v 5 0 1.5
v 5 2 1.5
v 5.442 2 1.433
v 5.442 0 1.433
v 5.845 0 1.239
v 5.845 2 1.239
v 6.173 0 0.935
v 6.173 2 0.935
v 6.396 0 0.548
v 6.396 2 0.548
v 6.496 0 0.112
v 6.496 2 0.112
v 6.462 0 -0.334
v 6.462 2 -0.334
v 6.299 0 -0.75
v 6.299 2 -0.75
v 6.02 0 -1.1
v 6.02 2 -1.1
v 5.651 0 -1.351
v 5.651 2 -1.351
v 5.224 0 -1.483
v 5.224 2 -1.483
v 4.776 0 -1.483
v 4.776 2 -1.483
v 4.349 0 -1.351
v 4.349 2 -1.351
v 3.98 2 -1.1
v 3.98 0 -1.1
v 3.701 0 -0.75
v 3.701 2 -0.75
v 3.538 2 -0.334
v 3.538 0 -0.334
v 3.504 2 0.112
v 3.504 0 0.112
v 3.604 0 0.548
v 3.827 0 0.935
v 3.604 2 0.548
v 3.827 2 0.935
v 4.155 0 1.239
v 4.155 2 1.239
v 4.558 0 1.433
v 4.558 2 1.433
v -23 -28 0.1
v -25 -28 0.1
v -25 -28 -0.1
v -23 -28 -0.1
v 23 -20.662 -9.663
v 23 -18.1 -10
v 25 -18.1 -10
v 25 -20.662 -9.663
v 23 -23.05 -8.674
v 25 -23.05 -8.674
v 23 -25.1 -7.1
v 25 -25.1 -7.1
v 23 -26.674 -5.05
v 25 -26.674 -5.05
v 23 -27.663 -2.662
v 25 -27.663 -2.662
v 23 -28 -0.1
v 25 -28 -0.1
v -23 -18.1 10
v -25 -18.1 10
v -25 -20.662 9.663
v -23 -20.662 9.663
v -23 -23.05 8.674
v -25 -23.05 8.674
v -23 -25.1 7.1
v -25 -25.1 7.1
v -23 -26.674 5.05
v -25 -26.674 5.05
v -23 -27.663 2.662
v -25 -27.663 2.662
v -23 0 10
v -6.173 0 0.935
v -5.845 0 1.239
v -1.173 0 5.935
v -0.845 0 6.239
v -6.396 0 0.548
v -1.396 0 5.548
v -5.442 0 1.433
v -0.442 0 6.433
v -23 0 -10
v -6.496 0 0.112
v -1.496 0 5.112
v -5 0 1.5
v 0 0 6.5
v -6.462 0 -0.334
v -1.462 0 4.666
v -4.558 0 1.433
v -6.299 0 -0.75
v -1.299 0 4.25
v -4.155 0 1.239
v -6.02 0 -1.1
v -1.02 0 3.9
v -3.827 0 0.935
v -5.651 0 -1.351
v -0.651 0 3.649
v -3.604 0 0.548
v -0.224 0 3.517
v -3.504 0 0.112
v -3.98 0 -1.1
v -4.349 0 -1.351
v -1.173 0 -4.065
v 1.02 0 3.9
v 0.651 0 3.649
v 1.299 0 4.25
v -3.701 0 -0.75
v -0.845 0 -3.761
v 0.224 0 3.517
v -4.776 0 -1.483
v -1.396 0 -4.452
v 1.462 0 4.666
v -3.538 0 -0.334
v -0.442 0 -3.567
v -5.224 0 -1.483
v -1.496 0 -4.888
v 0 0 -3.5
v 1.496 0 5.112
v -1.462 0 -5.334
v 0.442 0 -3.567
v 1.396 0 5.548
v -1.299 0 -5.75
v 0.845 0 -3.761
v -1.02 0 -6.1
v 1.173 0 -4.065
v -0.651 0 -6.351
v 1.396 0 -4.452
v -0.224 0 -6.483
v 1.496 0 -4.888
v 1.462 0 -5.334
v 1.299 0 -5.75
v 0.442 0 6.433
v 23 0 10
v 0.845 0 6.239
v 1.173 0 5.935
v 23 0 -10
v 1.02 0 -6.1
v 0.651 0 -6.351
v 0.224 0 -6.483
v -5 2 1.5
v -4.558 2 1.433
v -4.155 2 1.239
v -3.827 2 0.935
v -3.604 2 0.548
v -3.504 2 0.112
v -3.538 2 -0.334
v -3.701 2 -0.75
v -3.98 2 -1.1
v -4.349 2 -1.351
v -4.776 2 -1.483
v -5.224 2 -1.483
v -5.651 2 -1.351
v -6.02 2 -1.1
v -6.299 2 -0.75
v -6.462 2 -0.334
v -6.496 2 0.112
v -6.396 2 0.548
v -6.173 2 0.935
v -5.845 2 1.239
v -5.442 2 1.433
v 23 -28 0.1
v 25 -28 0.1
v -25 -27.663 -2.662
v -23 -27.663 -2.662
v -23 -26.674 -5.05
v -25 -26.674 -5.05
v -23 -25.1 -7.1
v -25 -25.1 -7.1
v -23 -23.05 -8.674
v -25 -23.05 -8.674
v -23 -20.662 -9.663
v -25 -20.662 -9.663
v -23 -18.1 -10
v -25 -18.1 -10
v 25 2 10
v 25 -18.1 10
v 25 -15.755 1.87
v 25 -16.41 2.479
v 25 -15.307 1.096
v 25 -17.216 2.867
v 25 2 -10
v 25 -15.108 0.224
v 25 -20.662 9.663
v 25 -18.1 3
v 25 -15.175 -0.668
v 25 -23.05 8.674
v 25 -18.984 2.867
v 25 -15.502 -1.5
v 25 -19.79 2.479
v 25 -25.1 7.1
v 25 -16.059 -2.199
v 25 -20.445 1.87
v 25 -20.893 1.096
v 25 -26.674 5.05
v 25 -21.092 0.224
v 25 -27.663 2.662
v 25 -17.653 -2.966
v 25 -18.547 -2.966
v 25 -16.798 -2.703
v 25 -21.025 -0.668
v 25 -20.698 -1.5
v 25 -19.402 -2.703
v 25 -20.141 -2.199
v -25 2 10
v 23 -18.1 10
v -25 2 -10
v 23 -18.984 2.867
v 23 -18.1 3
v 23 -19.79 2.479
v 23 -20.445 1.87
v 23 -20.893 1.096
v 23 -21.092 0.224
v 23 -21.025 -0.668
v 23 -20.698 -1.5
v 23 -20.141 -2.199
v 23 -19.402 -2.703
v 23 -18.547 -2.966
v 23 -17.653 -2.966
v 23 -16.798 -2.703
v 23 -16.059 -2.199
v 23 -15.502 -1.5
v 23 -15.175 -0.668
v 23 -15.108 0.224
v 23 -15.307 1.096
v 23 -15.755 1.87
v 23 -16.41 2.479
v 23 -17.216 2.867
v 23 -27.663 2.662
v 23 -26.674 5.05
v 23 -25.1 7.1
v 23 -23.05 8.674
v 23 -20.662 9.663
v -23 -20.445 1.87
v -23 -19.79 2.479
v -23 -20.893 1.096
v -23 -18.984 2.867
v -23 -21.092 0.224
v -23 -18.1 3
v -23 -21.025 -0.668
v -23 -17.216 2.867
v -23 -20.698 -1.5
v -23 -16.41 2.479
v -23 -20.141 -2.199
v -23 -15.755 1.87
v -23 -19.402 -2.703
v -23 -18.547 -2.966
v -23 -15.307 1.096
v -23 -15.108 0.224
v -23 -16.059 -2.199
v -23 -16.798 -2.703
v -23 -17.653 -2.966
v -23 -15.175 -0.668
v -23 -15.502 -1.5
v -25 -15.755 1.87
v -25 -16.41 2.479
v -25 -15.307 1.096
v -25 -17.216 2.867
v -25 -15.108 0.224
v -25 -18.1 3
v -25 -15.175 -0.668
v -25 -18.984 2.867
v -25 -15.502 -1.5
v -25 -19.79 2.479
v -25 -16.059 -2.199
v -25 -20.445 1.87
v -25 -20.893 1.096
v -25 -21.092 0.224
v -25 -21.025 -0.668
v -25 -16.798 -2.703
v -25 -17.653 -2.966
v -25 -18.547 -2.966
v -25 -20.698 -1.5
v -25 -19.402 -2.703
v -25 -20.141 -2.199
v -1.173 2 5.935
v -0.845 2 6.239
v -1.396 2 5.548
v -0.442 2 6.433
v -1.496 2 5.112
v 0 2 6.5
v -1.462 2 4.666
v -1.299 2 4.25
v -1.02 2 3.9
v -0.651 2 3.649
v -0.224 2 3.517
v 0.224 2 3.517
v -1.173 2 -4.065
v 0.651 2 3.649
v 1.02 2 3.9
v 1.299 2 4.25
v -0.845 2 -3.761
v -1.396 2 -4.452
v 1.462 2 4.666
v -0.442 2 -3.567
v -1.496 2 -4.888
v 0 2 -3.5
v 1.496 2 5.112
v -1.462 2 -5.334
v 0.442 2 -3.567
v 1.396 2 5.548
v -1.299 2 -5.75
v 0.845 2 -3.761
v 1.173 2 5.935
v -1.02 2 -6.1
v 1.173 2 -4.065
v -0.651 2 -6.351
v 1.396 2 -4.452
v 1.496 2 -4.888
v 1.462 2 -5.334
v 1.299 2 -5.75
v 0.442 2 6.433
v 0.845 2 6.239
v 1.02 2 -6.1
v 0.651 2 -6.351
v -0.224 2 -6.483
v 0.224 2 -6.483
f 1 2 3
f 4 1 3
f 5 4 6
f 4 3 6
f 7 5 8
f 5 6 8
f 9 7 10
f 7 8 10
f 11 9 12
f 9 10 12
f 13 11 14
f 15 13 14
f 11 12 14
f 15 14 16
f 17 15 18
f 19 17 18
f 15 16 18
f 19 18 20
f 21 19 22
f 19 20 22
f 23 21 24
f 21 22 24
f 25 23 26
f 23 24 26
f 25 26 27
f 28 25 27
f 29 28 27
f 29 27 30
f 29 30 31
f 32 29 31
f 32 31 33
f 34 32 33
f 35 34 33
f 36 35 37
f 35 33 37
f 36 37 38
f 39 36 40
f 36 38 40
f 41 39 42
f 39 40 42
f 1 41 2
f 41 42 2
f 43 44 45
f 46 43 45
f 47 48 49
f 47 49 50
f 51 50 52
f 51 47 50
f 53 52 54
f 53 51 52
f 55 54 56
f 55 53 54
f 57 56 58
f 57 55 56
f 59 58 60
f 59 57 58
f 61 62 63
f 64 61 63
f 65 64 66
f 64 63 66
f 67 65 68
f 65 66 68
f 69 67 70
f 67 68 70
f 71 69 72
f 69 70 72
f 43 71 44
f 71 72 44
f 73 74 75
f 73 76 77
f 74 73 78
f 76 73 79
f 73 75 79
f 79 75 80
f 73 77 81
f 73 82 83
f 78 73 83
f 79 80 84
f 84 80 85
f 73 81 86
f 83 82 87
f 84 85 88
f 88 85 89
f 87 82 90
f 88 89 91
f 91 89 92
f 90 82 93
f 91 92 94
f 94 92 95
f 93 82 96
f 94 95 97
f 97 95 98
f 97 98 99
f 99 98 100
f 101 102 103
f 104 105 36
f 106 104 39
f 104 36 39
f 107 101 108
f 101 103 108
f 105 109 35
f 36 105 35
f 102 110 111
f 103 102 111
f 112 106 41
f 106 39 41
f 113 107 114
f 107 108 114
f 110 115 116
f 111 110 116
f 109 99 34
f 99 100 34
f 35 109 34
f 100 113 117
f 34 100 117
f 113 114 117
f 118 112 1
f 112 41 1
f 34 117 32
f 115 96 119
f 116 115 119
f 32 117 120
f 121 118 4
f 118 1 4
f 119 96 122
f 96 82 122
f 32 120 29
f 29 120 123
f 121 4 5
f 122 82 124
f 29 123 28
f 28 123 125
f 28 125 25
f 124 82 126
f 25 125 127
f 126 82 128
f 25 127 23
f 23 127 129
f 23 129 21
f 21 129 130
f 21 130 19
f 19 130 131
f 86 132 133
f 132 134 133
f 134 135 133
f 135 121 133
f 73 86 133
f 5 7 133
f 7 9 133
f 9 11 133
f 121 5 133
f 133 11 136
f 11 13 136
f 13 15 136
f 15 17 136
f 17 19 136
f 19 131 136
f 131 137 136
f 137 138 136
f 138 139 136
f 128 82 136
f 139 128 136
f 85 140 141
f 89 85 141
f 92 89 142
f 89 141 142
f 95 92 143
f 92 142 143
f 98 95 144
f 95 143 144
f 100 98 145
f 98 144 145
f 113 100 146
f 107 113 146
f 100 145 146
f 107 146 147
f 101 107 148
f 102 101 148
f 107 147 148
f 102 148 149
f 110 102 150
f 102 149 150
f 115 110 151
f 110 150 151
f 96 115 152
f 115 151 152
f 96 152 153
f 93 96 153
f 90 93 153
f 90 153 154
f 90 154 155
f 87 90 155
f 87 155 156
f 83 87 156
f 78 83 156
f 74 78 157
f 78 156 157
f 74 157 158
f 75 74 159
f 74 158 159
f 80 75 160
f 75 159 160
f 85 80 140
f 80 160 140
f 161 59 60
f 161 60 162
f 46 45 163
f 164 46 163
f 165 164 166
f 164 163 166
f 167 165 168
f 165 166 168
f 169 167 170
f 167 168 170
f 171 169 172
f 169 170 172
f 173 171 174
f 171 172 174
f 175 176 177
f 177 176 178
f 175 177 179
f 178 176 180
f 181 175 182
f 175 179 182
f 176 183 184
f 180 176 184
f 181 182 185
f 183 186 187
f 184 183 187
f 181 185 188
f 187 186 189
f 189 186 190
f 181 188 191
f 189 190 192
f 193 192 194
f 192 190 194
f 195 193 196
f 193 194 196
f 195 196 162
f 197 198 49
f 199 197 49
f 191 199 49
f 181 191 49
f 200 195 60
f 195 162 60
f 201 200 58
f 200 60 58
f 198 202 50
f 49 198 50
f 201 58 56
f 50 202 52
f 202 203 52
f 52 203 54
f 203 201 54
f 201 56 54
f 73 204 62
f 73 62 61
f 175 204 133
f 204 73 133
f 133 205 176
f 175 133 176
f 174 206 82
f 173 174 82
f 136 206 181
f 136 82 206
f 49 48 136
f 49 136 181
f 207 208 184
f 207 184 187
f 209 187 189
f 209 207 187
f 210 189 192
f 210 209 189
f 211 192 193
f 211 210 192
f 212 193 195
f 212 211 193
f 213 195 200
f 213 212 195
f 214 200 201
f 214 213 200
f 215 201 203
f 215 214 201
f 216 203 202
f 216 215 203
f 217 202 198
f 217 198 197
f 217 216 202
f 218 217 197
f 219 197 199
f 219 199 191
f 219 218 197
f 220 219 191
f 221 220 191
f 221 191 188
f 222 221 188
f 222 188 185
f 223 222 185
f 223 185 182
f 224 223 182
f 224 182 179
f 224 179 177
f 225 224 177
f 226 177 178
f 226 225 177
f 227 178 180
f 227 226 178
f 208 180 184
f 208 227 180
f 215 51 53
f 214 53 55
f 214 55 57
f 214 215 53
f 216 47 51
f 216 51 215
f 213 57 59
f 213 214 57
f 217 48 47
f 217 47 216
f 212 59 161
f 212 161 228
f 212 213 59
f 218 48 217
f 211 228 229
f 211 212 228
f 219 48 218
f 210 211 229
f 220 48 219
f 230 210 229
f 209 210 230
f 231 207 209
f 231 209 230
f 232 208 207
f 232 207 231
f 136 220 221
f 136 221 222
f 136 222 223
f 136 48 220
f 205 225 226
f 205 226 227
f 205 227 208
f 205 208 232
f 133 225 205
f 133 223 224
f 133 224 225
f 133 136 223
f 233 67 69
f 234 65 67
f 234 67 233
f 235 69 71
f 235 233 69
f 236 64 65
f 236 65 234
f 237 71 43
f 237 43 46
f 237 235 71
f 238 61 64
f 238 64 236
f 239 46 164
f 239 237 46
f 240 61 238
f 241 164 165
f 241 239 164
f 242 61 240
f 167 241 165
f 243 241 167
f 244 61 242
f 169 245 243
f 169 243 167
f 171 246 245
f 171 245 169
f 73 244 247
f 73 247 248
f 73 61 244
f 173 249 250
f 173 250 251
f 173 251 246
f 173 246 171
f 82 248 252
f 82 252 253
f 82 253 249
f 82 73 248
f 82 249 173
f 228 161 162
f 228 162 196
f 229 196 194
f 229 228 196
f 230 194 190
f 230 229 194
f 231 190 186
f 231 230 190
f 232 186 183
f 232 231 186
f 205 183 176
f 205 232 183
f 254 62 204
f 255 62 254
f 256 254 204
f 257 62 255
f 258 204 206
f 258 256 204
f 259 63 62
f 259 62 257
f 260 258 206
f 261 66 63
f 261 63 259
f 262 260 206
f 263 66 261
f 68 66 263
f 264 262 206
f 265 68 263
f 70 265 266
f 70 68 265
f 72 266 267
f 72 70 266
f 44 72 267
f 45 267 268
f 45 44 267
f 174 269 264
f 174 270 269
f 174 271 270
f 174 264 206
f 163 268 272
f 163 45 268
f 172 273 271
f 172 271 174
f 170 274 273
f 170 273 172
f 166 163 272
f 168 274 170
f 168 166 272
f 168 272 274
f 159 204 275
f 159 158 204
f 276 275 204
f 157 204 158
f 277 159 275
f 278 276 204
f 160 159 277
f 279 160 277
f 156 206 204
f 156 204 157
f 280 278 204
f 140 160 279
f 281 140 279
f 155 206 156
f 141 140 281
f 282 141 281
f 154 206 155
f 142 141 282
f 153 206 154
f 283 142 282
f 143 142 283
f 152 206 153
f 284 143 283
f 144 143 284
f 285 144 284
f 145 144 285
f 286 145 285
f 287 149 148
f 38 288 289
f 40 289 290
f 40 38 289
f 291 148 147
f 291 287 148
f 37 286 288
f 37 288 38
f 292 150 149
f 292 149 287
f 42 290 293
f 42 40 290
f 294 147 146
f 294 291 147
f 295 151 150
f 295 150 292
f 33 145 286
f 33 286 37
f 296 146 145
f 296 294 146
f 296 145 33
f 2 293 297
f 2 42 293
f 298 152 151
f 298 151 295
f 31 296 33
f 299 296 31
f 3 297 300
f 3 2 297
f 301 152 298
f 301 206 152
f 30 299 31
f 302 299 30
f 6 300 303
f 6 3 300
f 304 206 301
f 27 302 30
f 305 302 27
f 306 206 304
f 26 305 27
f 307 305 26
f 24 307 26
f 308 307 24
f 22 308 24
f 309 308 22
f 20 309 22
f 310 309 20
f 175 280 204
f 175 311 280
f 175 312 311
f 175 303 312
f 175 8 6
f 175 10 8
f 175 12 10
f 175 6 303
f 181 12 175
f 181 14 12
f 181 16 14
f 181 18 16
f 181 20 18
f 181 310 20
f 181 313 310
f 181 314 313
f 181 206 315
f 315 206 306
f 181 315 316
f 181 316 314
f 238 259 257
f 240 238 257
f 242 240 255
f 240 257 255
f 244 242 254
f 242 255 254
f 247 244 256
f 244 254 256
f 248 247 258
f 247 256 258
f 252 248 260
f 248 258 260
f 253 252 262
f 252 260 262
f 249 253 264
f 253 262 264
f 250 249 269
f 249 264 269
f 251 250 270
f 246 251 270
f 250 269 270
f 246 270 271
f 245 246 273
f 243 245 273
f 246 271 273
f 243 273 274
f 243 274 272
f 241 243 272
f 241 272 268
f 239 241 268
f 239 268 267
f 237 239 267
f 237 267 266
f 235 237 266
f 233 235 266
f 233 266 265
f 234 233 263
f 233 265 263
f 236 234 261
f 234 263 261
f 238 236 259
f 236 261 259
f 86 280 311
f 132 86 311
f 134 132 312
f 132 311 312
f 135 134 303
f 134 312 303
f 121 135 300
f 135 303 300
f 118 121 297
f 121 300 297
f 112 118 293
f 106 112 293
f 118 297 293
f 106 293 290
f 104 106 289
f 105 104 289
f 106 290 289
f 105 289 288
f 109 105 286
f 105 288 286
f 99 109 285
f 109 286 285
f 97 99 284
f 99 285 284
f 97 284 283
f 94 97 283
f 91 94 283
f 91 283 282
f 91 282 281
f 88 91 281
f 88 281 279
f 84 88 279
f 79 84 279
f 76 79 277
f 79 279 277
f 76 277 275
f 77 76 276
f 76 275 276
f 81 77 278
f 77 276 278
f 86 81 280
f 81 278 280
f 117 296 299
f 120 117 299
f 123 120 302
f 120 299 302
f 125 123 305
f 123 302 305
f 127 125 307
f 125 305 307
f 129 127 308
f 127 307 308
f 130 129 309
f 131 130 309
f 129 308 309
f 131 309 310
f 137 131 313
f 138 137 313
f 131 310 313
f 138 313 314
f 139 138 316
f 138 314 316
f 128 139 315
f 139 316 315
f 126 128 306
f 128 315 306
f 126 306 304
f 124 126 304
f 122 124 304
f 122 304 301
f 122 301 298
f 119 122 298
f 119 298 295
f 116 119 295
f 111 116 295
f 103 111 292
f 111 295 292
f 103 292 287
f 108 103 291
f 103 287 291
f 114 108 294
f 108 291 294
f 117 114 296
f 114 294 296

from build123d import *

# Parameters (mm, degrees)
SKETCH_1_W          = 50
SKETCH_1_H          = 20
EXTRUDE_1_DEPTH     = 2
SKETCH_2_R          = 3
EXTRUDE_2_DEPTH     = 2
EXTRUDE_START       = -2
SKETCH_3_R          = 3
EXTRUDE_3_DEPTH     = 2
SKETCH_4_R          = 1.5
CUT_EXTRUDE_1_DEPTH = 2


with BuildPart() as part:
    # 草图1 → 凸台-拉伸1 (new body)
    with BuildSketch(Plane(origin=(0, 0, 0), x_dir=(1, 0, 0), z_dir=(0, 1, 0))):
        Rectangle(SKETCH_1_W, SKETCH_1_H)
    extrude(amount=EXTRUDE_1_DEPTH)

    # 草图2 → 凸台-拉伸2 (add)
    with BuildSketch(Plane.ZY.offset(25)):
        with BuildLine():
            Line((-10, 2), (10, 2))
            Line((10, 2), (10, -18.1))
            ThreePointArc((10, -18.1), (7.100357134, -25.100357134), (0.1, -28))
            Line((0.1, -28), (-0.1, -28))
            ThreePointArc((-0.1, -28), (-7.100357134, -25.100357134), (-10, -18.1))
            Line((-10, -18.1), (-10, 2))
        make_face()
        with Locations((0, -18.1)):
            Circle(SKETCH_2_R, mode=Mode.SUBTRACT)
    extrude(amount=-EXTRUDE_2_DEPTH)

    # 草图3 → 凸台-拉伸3 (add)
    with BuildSketch(Plane(origin=(25, 0, 0), x_dir=(0, 0, -1), z_dir=(1, 0, 0)).offset(EXTRUDE_START)):
        with BuildLine():
            Line((-10, 2), (10, 2))
            Line((10, 2), (10, -18.1))
            ThreePointArc((10, -18.1), (7.100357134, -25.100357134), (0.1, -28))
            Line((0.1, -28), (-0.1, -28))
            ThreePointArc((-0.1, -28), (-7.100357134, -25.100357134), (-10, -18.1))
            Line((-10, -18.1), (-10, 2))
        make_face()
        with Locations(Location((0, -18.1, 0), (0, 0, 180))):
            Circle(SKETCH_3_R, mode=Mode.SUBTRACT)
    extrude(amount=EXTRUDE_3_DEPTH)

    # 草图4 → 切除-拉伸1 (cut)
    with BuildSketch(Plane(origin=(0, 2, 0), x_dir=(1, 0, 0), z_dir=(0, 1, 0))):
        with Locations(Location((0, 5, 0), (0, 0, 270))):
            Circle(SKETCH_4_R)
        with Locations(Location((5, 0, 0), (0, 0, 270))):
            Circle(SKETCH_4_R)
        with Locations(Location((0, -5, 0), (0, 0, 270))):
            Circle(SKETCH_4_R)
        with Locations(Location((-5, 0, 0), (0, 0, 270))):
            Circle(SKETCH_4_R)
    extrude(amount=-CUT_EXTRUDE_1_DEPTH, mode=Mode.SUBTRACT)


solid = part.part
